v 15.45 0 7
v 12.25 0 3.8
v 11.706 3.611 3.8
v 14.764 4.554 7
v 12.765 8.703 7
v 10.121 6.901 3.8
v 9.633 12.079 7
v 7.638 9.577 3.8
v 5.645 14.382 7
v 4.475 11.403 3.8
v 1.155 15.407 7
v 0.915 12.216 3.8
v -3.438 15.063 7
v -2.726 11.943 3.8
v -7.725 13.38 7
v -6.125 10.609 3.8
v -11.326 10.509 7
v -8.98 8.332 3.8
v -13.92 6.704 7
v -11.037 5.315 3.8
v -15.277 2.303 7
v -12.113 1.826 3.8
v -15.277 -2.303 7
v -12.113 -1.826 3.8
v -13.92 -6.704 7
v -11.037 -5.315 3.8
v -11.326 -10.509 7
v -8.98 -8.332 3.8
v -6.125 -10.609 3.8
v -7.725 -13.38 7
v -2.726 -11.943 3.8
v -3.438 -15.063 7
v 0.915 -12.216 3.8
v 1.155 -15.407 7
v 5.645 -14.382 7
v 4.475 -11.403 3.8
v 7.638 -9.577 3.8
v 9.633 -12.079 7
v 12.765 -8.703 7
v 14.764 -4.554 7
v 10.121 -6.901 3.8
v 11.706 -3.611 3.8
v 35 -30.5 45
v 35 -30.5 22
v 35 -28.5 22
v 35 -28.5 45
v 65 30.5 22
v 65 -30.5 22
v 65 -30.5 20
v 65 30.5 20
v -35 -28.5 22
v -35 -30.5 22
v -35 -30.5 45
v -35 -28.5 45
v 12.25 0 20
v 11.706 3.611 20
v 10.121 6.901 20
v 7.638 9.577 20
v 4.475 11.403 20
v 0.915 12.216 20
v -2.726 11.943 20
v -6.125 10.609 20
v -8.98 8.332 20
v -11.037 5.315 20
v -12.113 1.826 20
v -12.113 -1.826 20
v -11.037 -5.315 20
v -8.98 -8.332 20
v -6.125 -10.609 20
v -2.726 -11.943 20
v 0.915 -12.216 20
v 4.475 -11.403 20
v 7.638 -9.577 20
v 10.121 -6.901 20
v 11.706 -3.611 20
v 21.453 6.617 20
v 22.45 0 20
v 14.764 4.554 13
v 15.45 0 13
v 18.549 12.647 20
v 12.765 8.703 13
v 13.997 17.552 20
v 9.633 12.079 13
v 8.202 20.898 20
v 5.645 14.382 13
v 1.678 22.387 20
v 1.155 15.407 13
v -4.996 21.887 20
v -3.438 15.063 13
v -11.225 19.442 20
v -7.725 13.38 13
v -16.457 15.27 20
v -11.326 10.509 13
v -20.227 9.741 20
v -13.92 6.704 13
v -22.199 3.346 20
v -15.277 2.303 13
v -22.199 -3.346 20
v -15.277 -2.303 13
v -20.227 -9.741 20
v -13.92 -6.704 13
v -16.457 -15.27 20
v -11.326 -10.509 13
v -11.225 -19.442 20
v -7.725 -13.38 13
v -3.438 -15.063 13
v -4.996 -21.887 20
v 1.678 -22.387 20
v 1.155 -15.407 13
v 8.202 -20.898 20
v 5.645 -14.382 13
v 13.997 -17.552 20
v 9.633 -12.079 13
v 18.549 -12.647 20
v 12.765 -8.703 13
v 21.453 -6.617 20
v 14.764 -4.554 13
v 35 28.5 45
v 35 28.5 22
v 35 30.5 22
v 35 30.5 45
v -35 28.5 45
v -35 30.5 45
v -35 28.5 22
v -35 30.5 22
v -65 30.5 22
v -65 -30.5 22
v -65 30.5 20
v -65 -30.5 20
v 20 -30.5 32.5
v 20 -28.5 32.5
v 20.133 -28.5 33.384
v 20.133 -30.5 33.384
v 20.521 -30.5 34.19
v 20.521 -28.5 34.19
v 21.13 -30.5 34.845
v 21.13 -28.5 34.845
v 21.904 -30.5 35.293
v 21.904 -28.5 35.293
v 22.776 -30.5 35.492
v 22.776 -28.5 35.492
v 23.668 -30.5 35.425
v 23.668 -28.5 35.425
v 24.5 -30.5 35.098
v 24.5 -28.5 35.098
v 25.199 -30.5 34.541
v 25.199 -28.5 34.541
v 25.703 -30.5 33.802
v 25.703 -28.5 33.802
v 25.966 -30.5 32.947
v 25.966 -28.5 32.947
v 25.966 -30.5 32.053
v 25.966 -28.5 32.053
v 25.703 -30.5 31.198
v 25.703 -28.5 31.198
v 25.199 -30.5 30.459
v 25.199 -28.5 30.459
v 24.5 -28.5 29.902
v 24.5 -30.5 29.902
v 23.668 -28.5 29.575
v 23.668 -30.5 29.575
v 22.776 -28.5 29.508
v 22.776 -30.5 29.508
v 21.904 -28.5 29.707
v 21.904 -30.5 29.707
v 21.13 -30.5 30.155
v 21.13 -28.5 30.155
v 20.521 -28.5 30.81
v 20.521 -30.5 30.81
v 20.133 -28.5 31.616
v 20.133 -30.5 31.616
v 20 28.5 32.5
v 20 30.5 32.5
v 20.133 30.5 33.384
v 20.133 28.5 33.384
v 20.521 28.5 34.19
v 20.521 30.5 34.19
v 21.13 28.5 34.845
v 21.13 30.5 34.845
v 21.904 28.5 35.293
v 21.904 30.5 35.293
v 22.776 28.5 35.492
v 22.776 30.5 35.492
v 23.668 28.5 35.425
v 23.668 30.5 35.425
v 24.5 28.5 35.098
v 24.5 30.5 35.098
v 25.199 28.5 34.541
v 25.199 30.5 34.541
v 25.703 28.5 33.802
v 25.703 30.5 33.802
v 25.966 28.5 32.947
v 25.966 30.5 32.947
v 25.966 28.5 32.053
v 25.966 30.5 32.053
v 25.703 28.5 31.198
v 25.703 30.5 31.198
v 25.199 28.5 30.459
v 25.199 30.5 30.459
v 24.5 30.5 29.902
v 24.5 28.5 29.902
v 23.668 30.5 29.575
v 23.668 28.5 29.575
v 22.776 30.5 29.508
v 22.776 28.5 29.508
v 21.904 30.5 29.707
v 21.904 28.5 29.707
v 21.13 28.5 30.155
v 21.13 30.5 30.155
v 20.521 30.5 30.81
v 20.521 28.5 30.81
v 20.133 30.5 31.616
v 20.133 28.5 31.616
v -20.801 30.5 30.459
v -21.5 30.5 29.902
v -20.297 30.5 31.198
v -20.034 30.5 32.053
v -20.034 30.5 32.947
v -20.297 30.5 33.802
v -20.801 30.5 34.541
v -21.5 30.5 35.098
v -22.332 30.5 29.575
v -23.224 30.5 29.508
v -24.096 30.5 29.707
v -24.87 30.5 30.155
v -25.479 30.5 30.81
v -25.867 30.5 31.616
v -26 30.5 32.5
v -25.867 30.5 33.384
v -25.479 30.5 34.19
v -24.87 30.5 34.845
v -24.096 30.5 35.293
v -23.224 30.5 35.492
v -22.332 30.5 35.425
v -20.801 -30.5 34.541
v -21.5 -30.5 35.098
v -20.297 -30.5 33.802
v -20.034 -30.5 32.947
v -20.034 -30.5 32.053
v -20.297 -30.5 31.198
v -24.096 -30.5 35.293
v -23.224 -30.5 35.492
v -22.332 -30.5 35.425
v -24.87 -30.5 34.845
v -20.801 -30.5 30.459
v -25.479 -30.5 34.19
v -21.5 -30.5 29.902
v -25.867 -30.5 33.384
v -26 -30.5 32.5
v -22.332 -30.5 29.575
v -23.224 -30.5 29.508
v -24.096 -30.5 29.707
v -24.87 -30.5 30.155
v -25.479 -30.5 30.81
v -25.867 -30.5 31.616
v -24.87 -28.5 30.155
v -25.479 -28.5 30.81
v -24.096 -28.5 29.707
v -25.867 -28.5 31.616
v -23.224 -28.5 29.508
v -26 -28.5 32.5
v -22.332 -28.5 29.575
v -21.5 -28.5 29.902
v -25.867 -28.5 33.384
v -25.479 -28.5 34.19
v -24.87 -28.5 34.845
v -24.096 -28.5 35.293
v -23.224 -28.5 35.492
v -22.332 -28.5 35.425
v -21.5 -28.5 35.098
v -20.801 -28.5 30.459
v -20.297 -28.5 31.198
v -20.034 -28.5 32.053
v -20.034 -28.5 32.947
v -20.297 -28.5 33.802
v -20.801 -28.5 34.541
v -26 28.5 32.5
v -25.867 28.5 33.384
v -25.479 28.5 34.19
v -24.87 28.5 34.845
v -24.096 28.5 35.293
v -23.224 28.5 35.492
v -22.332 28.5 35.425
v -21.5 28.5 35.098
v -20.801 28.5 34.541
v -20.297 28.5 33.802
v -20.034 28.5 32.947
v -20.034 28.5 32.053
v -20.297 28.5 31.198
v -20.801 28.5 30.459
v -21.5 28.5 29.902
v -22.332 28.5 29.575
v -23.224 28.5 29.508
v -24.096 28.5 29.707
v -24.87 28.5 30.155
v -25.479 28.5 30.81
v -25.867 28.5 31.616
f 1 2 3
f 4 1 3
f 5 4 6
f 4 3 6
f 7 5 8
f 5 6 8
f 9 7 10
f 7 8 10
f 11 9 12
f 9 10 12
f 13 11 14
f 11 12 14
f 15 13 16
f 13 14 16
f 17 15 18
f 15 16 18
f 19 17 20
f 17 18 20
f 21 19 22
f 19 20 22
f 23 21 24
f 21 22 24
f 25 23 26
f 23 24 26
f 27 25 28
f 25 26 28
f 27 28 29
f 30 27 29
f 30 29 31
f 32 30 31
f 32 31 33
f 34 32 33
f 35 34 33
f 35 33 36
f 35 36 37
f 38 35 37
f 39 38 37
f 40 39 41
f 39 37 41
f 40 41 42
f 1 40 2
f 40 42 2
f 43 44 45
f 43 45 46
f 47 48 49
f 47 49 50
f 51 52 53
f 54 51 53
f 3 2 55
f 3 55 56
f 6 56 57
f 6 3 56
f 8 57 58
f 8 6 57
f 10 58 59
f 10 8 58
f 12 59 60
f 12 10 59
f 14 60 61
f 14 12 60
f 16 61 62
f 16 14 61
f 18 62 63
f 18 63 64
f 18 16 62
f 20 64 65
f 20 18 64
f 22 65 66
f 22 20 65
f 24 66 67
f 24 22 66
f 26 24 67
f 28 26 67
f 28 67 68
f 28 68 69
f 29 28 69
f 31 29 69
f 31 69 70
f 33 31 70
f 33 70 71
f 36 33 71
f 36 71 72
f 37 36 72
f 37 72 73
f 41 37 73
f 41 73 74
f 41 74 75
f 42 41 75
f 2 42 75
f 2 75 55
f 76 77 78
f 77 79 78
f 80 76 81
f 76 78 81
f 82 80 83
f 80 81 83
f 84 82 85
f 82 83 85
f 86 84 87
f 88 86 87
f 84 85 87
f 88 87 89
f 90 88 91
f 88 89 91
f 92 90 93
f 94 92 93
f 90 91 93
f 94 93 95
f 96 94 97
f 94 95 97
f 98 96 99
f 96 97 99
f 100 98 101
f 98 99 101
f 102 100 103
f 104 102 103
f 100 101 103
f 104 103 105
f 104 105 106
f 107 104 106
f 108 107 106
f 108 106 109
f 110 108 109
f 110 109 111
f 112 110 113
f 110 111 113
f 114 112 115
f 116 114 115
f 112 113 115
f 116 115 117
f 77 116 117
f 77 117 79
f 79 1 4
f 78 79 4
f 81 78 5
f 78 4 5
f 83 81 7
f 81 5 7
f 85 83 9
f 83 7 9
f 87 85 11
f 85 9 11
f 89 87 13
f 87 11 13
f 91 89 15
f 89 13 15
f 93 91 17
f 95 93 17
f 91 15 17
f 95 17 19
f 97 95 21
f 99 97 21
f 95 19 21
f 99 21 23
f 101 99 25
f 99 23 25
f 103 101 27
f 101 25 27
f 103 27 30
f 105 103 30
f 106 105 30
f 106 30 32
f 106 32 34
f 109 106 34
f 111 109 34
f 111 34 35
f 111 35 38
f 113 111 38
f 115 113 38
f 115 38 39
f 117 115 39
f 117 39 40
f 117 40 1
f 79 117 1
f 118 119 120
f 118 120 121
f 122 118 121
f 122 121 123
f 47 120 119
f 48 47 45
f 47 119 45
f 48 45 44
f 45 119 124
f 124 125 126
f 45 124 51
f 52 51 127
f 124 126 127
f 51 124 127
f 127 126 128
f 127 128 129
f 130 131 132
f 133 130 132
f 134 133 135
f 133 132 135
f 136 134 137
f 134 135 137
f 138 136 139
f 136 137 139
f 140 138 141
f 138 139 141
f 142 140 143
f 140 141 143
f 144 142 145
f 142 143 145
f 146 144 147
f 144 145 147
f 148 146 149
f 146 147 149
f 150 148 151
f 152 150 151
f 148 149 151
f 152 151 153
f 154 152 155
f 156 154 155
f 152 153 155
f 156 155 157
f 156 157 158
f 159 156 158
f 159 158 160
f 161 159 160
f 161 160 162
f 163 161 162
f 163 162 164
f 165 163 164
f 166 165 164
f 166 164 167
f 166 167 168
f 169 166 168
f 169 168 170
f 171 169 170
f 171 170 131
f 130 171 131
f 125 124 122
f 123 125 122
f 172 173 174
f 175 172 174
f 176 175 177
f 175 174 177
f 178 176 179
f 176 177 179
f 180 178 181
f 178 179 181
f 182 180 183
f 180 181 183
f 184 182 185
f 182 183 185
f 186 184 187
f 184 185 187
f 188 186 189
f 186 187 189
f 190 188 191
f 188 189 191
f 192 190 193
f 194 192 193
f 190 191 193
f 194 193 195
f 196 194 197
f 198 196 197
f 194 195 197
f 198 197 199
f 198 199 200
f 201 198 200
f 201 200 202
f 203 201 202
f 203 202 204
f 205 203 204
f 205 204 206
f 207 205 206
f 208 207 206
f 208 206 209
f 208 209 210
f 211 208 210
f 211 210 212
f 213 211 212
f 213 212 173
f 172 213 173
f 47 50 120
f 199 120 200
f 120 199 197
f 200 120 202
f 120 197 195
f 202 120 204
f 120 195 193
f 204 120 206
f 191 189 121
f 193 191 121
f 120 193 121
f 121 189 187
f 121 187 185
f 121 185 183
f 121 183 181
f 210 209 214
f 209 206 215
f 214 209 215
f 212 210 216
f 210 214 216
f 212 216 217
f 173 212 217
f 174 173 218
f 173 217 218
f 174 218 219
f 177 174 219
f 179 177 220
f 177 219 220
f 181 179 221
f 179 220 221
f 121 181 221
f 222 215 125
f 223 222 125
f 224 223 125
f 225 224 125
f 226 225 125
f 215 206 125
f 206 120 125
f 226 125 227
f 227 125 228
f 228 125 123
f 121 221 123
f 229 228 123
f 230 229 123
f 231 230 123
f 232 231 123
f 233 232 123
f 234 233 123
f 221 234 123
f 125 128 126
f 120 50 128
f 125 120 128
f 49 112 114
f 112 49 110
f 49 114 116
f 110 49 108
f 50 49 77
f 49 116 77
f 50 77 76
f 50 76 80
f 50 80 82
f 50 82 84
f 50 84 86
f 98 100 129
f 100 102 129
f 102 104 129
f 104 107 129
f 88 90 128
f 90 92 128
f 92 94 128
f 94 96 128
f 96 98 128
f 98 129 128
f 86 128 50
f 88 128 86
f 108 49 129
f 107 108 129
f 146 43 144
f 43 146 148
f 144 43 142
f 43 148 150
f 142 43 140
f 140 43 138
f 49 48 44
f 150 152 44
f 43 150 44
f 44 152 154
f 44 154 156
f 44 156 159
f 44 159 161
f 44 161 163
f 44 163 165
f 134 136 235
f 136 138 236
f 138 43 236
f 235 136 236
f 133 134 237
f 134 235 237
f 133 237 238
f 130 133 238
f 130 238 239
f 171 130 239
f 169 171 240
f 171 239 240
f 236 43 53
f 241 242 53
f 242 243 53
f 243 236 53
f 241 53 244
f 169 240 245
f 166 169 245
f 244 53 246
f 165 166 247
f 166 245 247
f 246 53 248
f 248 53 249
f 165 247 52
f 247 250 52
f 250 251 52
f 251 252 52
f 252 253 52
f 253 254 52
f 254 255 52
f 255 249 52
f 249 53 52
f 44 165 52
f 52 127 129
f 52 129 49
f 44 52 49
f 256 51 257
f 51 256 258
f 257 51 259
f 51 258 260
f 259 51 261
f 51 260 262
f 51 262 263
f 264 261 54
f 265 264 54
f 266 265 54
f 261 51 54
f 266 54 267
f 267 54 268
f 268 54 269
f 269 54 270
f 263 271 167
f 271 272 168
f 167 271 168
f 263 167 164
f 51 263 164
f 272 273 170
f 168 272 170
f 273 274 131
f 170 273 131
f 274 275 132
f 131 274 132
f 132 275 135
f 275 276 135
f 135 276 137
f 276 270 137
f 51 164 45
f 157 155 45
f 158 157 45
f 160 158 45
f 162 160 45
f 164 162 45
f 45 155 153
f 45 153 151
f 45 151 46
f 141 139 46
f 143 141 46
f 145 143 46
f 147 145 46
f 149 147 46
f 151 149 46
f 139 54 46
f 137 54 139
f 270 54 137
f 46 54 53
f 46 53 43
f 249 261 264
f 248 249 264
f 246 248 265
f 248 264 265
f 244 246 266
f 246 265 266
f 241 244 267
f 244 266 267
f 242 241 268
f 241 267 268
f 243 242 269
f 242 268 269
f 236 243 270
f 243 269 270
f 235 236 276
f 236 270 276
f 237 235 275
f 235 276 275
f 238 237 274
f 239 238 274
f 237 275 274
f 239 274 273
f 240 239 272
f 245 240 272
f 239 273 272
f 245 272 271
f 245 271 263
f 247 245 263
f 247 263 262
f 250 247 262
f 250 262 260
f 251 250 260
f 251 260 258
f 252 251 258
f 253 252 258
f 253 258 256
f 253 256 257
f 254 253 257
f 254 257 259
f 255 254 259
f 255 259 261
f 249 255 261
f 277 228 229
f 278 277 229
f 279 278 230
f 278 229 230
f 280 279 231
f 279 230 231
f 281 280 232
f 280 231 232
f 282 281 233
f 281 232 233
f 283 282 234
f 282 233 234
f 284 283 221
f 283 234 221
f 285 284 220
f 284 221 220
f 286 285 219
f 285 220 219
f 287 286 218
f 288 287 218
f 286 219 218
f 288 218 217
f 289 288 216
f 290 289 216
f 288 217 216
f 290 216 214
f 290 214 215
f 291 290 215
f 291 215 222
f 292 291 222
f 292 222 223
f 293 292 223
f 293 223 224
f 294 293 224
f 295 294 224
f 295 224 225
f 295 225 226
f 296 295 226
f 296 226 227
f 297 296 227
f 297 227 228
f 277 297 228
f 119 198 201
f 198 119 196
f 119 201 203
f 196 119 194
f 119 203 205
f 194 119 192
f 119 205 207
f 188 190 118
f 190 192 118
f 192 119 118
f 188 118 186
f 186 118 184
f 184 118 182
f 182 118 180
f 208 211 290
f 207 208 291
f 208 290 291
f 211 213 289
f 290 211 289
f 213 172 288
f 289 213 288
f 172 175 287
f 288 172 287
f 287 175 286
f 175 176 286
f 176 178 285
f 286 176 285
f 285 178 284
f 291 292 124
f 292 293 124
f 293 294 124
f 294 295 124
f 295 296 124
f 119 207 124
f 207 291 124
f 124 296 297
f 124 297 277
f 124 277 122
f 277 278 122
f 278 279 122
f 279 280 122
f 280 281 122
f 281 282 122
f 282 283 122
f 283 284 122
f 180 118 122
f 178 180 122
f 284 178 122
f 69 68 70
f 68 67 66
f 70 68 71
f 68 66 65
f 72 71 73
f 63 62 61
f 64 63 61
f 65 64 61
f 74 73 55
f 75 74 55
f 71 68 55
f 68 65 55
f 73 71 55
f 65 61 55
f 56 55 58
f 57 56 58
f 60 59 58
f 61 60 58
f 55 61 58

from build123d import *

# Parameters (mm, degrees)
F0_R      = 15.45
F0_R_2    = 12.25
F1_DEPTH  = 20
F2_W      = 70
F2_H      = 57
F3_DEPTH  = 2
F4_W      = 70
F4_H      = 25
F5_DEPTH  = 2
F6_W      = 70
F6_H      = 25
F7_DEPTH  = 2
F10_D     = 6
F11_W     = 61
F11_H     = 2
F12_DEPTH = 30
F14_DEPTH = 30


# Not quite as in the source:
# - a fillet or chamfer that OpenCascade refuses, or shapes differently, is made with other operations: its cross-section is extruded or revolved along the edge and cut away or added


with BuildPart() as f1:
    # F0 (on Top) → F1 (new body)
    with BuildSketch(Plane.XY):
        Circle(F0_R)
        Circle(F0_R_2, mode=Mode.SUBTRACT)
    extrude(amount=F1_DEPTH)

    # F2 (on face) → F3 (join)
    with BuildSketch(Plane.XY.offset(20)):
        Rectangle(F2_W, F2_H)
    extrude(amount=F3_DEPTH)

    # F4 (on face) → F5 (join)
    with BuildSketch(Plane.XZ.offset(28.5)):
        with Locations((0, 32.5)):
            Rectangle(F4_W, F4_H)
    extrude(amount=F5_DEPTH)

    # F6 (on face) → F7 (join)
    with BuildSketch(Plane(origin=(0, 28.5, 0), x_dir=(-1, 0, 0), z_dir=(0, 1, 0))):
        with Locations((0, 32.5)):
            Rectangle(F6_W, F6_H)
    extrude(amount=F7_DEPTH)

    # F8: chamfer of 7 on 3 edges, made by hand

    # F8_s1 → F8_t2 (revolve)
    with BuildSketch(Plane.XZ):
        Polygon((22.45, 20), (15.45, 13), (15.45, 20), align=None)
    revolve(axis=Axis((0, 0, 20), (0, 0, 1)))

    # F8_s3 → F8_t4 (revolve, cut)
    with BuildSketch(Plane.XZ):
        Polygon((15.45, 7), (8.45, 0), (15.45, 0), align=None)
    revolve(axis=Axis((0, 0, 0), (0, 0, 1)), mode=Mode.SUBTRACT)

    # F10 (through all)
    with Locations(Plane.XZ.offset(30.5)):
        with Locations((-23, 32.5), (23, 32.5)):
            Hole(F10_D / 2)

    # F11 (on face) → F12 (join)
    with BuildSketch(Plane(origin=(-35, 0, 0), x_dir=(0, -1, 0), z_dir=(-1, 0, 0))):
        with Locations((0, 21)):
            Rectangle(F11_W, F11_H)
    extrude(amount=F12_DEPTH)

    # F13 (on face) → F14 (join)
    with BuildSketch(Plane.YZ.offset(35)):
        Polygon((-30.5, 22), (-30.5, 20), (30.5, 20), (30.5, 22), (28.5, 22), (-28.5, 22), align=None)
    extrude(amount=F14_DEPTH)


solid = f1.part
